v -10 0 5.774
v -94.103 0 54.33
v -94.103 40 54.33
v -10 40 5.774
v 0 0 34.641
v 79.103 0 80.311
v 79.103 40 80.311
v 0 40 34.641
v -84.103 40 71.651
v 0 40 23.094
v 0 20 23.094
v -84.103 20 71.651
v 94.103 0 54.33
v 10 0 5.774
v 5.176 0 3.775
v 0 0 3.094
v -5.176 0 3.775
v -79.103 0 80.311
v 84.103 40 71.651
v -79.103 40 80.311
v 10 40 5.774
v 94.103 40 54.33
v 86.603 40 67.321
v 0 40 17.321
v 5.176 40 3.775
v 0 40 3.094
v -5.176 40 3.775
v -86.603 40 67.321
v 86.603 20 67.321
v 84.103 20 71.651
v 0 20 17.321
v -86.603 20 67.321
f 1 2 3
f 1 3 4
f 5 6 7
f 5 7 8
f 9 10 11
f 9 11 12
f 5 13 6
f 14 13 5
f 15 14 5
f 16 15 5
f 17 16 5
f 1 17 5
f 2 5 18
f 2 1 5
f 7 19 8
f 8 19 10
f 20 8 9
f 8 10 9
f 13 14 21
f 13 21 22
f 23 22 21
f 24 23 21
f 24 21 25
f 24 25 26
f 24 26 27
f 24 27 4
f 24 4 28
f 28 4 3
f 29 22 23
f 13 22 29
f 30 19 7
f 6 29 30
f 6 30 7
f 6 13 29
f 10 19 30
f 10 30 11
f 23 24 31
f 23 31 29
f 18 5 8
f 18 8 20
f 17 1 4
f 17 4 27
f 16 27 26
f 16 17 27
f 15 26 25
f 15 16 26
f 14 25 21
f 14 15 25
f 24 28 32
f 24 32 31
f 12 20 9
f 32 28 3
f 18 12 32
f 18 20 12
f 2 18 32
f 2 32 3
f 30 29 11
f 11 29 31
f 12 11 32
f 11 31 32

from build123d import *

# Parameters (mm, degrees)
BOSS_EXTRUDE1_DEPTH = 40
CUT_EXTRUDE1_DEPTH  = 20


with BuildPart() as part:
    # Sketch1 → Boss-Extrude1 (new body)
    with BuildSketch(Plane(origin=(0, 0, 0), x_dir=(1, 0, 0), z_dir=(0, 1, 0))):
        with BuildLine():
            Line((10, -5.773502692), (94.102760382, -54.330254038))
            Line((94.102760382, -54.330254038), (79.102760382, -80.311016151))
            Line((79.102760382, -80.311016151), (0, -34.641016151))
            Line((0, -34.641016151), (-79.102760382, -80.311016151))
            Line((-79.102760382, -80.311016151), (-94.102760382, -54.330254038))
            Line((-94.102760382, -54.330254038), (-10, -5.773502692))
            ThreePointArc((-10, -5.773502692), (0, -3.094010768), (10, -5.773502692))
        make_face()
    extrude(amount=BOSS_EXTRUDE1_DEPTH)

    # Sketch2 → Cut-Extrude1 (cut)
    with BuildSketch(Plane(origin=(0, 40, 0), x_dir=(1, 0, 0), z_dir=(0, 1, 0))):
        Polygon((-86.602760382, -67.320635095), (0, -17.320508076), (86.602760382, -67.320635095), (84.102760382, -71.650762114), (0, -23.094010768), (-84.102760382, -71.650762114), align=None)
    extrude(amount=-CUT_EXTRUDE1_DEPTH, mode=Mode.SUBTRACT)


solid = part.part
